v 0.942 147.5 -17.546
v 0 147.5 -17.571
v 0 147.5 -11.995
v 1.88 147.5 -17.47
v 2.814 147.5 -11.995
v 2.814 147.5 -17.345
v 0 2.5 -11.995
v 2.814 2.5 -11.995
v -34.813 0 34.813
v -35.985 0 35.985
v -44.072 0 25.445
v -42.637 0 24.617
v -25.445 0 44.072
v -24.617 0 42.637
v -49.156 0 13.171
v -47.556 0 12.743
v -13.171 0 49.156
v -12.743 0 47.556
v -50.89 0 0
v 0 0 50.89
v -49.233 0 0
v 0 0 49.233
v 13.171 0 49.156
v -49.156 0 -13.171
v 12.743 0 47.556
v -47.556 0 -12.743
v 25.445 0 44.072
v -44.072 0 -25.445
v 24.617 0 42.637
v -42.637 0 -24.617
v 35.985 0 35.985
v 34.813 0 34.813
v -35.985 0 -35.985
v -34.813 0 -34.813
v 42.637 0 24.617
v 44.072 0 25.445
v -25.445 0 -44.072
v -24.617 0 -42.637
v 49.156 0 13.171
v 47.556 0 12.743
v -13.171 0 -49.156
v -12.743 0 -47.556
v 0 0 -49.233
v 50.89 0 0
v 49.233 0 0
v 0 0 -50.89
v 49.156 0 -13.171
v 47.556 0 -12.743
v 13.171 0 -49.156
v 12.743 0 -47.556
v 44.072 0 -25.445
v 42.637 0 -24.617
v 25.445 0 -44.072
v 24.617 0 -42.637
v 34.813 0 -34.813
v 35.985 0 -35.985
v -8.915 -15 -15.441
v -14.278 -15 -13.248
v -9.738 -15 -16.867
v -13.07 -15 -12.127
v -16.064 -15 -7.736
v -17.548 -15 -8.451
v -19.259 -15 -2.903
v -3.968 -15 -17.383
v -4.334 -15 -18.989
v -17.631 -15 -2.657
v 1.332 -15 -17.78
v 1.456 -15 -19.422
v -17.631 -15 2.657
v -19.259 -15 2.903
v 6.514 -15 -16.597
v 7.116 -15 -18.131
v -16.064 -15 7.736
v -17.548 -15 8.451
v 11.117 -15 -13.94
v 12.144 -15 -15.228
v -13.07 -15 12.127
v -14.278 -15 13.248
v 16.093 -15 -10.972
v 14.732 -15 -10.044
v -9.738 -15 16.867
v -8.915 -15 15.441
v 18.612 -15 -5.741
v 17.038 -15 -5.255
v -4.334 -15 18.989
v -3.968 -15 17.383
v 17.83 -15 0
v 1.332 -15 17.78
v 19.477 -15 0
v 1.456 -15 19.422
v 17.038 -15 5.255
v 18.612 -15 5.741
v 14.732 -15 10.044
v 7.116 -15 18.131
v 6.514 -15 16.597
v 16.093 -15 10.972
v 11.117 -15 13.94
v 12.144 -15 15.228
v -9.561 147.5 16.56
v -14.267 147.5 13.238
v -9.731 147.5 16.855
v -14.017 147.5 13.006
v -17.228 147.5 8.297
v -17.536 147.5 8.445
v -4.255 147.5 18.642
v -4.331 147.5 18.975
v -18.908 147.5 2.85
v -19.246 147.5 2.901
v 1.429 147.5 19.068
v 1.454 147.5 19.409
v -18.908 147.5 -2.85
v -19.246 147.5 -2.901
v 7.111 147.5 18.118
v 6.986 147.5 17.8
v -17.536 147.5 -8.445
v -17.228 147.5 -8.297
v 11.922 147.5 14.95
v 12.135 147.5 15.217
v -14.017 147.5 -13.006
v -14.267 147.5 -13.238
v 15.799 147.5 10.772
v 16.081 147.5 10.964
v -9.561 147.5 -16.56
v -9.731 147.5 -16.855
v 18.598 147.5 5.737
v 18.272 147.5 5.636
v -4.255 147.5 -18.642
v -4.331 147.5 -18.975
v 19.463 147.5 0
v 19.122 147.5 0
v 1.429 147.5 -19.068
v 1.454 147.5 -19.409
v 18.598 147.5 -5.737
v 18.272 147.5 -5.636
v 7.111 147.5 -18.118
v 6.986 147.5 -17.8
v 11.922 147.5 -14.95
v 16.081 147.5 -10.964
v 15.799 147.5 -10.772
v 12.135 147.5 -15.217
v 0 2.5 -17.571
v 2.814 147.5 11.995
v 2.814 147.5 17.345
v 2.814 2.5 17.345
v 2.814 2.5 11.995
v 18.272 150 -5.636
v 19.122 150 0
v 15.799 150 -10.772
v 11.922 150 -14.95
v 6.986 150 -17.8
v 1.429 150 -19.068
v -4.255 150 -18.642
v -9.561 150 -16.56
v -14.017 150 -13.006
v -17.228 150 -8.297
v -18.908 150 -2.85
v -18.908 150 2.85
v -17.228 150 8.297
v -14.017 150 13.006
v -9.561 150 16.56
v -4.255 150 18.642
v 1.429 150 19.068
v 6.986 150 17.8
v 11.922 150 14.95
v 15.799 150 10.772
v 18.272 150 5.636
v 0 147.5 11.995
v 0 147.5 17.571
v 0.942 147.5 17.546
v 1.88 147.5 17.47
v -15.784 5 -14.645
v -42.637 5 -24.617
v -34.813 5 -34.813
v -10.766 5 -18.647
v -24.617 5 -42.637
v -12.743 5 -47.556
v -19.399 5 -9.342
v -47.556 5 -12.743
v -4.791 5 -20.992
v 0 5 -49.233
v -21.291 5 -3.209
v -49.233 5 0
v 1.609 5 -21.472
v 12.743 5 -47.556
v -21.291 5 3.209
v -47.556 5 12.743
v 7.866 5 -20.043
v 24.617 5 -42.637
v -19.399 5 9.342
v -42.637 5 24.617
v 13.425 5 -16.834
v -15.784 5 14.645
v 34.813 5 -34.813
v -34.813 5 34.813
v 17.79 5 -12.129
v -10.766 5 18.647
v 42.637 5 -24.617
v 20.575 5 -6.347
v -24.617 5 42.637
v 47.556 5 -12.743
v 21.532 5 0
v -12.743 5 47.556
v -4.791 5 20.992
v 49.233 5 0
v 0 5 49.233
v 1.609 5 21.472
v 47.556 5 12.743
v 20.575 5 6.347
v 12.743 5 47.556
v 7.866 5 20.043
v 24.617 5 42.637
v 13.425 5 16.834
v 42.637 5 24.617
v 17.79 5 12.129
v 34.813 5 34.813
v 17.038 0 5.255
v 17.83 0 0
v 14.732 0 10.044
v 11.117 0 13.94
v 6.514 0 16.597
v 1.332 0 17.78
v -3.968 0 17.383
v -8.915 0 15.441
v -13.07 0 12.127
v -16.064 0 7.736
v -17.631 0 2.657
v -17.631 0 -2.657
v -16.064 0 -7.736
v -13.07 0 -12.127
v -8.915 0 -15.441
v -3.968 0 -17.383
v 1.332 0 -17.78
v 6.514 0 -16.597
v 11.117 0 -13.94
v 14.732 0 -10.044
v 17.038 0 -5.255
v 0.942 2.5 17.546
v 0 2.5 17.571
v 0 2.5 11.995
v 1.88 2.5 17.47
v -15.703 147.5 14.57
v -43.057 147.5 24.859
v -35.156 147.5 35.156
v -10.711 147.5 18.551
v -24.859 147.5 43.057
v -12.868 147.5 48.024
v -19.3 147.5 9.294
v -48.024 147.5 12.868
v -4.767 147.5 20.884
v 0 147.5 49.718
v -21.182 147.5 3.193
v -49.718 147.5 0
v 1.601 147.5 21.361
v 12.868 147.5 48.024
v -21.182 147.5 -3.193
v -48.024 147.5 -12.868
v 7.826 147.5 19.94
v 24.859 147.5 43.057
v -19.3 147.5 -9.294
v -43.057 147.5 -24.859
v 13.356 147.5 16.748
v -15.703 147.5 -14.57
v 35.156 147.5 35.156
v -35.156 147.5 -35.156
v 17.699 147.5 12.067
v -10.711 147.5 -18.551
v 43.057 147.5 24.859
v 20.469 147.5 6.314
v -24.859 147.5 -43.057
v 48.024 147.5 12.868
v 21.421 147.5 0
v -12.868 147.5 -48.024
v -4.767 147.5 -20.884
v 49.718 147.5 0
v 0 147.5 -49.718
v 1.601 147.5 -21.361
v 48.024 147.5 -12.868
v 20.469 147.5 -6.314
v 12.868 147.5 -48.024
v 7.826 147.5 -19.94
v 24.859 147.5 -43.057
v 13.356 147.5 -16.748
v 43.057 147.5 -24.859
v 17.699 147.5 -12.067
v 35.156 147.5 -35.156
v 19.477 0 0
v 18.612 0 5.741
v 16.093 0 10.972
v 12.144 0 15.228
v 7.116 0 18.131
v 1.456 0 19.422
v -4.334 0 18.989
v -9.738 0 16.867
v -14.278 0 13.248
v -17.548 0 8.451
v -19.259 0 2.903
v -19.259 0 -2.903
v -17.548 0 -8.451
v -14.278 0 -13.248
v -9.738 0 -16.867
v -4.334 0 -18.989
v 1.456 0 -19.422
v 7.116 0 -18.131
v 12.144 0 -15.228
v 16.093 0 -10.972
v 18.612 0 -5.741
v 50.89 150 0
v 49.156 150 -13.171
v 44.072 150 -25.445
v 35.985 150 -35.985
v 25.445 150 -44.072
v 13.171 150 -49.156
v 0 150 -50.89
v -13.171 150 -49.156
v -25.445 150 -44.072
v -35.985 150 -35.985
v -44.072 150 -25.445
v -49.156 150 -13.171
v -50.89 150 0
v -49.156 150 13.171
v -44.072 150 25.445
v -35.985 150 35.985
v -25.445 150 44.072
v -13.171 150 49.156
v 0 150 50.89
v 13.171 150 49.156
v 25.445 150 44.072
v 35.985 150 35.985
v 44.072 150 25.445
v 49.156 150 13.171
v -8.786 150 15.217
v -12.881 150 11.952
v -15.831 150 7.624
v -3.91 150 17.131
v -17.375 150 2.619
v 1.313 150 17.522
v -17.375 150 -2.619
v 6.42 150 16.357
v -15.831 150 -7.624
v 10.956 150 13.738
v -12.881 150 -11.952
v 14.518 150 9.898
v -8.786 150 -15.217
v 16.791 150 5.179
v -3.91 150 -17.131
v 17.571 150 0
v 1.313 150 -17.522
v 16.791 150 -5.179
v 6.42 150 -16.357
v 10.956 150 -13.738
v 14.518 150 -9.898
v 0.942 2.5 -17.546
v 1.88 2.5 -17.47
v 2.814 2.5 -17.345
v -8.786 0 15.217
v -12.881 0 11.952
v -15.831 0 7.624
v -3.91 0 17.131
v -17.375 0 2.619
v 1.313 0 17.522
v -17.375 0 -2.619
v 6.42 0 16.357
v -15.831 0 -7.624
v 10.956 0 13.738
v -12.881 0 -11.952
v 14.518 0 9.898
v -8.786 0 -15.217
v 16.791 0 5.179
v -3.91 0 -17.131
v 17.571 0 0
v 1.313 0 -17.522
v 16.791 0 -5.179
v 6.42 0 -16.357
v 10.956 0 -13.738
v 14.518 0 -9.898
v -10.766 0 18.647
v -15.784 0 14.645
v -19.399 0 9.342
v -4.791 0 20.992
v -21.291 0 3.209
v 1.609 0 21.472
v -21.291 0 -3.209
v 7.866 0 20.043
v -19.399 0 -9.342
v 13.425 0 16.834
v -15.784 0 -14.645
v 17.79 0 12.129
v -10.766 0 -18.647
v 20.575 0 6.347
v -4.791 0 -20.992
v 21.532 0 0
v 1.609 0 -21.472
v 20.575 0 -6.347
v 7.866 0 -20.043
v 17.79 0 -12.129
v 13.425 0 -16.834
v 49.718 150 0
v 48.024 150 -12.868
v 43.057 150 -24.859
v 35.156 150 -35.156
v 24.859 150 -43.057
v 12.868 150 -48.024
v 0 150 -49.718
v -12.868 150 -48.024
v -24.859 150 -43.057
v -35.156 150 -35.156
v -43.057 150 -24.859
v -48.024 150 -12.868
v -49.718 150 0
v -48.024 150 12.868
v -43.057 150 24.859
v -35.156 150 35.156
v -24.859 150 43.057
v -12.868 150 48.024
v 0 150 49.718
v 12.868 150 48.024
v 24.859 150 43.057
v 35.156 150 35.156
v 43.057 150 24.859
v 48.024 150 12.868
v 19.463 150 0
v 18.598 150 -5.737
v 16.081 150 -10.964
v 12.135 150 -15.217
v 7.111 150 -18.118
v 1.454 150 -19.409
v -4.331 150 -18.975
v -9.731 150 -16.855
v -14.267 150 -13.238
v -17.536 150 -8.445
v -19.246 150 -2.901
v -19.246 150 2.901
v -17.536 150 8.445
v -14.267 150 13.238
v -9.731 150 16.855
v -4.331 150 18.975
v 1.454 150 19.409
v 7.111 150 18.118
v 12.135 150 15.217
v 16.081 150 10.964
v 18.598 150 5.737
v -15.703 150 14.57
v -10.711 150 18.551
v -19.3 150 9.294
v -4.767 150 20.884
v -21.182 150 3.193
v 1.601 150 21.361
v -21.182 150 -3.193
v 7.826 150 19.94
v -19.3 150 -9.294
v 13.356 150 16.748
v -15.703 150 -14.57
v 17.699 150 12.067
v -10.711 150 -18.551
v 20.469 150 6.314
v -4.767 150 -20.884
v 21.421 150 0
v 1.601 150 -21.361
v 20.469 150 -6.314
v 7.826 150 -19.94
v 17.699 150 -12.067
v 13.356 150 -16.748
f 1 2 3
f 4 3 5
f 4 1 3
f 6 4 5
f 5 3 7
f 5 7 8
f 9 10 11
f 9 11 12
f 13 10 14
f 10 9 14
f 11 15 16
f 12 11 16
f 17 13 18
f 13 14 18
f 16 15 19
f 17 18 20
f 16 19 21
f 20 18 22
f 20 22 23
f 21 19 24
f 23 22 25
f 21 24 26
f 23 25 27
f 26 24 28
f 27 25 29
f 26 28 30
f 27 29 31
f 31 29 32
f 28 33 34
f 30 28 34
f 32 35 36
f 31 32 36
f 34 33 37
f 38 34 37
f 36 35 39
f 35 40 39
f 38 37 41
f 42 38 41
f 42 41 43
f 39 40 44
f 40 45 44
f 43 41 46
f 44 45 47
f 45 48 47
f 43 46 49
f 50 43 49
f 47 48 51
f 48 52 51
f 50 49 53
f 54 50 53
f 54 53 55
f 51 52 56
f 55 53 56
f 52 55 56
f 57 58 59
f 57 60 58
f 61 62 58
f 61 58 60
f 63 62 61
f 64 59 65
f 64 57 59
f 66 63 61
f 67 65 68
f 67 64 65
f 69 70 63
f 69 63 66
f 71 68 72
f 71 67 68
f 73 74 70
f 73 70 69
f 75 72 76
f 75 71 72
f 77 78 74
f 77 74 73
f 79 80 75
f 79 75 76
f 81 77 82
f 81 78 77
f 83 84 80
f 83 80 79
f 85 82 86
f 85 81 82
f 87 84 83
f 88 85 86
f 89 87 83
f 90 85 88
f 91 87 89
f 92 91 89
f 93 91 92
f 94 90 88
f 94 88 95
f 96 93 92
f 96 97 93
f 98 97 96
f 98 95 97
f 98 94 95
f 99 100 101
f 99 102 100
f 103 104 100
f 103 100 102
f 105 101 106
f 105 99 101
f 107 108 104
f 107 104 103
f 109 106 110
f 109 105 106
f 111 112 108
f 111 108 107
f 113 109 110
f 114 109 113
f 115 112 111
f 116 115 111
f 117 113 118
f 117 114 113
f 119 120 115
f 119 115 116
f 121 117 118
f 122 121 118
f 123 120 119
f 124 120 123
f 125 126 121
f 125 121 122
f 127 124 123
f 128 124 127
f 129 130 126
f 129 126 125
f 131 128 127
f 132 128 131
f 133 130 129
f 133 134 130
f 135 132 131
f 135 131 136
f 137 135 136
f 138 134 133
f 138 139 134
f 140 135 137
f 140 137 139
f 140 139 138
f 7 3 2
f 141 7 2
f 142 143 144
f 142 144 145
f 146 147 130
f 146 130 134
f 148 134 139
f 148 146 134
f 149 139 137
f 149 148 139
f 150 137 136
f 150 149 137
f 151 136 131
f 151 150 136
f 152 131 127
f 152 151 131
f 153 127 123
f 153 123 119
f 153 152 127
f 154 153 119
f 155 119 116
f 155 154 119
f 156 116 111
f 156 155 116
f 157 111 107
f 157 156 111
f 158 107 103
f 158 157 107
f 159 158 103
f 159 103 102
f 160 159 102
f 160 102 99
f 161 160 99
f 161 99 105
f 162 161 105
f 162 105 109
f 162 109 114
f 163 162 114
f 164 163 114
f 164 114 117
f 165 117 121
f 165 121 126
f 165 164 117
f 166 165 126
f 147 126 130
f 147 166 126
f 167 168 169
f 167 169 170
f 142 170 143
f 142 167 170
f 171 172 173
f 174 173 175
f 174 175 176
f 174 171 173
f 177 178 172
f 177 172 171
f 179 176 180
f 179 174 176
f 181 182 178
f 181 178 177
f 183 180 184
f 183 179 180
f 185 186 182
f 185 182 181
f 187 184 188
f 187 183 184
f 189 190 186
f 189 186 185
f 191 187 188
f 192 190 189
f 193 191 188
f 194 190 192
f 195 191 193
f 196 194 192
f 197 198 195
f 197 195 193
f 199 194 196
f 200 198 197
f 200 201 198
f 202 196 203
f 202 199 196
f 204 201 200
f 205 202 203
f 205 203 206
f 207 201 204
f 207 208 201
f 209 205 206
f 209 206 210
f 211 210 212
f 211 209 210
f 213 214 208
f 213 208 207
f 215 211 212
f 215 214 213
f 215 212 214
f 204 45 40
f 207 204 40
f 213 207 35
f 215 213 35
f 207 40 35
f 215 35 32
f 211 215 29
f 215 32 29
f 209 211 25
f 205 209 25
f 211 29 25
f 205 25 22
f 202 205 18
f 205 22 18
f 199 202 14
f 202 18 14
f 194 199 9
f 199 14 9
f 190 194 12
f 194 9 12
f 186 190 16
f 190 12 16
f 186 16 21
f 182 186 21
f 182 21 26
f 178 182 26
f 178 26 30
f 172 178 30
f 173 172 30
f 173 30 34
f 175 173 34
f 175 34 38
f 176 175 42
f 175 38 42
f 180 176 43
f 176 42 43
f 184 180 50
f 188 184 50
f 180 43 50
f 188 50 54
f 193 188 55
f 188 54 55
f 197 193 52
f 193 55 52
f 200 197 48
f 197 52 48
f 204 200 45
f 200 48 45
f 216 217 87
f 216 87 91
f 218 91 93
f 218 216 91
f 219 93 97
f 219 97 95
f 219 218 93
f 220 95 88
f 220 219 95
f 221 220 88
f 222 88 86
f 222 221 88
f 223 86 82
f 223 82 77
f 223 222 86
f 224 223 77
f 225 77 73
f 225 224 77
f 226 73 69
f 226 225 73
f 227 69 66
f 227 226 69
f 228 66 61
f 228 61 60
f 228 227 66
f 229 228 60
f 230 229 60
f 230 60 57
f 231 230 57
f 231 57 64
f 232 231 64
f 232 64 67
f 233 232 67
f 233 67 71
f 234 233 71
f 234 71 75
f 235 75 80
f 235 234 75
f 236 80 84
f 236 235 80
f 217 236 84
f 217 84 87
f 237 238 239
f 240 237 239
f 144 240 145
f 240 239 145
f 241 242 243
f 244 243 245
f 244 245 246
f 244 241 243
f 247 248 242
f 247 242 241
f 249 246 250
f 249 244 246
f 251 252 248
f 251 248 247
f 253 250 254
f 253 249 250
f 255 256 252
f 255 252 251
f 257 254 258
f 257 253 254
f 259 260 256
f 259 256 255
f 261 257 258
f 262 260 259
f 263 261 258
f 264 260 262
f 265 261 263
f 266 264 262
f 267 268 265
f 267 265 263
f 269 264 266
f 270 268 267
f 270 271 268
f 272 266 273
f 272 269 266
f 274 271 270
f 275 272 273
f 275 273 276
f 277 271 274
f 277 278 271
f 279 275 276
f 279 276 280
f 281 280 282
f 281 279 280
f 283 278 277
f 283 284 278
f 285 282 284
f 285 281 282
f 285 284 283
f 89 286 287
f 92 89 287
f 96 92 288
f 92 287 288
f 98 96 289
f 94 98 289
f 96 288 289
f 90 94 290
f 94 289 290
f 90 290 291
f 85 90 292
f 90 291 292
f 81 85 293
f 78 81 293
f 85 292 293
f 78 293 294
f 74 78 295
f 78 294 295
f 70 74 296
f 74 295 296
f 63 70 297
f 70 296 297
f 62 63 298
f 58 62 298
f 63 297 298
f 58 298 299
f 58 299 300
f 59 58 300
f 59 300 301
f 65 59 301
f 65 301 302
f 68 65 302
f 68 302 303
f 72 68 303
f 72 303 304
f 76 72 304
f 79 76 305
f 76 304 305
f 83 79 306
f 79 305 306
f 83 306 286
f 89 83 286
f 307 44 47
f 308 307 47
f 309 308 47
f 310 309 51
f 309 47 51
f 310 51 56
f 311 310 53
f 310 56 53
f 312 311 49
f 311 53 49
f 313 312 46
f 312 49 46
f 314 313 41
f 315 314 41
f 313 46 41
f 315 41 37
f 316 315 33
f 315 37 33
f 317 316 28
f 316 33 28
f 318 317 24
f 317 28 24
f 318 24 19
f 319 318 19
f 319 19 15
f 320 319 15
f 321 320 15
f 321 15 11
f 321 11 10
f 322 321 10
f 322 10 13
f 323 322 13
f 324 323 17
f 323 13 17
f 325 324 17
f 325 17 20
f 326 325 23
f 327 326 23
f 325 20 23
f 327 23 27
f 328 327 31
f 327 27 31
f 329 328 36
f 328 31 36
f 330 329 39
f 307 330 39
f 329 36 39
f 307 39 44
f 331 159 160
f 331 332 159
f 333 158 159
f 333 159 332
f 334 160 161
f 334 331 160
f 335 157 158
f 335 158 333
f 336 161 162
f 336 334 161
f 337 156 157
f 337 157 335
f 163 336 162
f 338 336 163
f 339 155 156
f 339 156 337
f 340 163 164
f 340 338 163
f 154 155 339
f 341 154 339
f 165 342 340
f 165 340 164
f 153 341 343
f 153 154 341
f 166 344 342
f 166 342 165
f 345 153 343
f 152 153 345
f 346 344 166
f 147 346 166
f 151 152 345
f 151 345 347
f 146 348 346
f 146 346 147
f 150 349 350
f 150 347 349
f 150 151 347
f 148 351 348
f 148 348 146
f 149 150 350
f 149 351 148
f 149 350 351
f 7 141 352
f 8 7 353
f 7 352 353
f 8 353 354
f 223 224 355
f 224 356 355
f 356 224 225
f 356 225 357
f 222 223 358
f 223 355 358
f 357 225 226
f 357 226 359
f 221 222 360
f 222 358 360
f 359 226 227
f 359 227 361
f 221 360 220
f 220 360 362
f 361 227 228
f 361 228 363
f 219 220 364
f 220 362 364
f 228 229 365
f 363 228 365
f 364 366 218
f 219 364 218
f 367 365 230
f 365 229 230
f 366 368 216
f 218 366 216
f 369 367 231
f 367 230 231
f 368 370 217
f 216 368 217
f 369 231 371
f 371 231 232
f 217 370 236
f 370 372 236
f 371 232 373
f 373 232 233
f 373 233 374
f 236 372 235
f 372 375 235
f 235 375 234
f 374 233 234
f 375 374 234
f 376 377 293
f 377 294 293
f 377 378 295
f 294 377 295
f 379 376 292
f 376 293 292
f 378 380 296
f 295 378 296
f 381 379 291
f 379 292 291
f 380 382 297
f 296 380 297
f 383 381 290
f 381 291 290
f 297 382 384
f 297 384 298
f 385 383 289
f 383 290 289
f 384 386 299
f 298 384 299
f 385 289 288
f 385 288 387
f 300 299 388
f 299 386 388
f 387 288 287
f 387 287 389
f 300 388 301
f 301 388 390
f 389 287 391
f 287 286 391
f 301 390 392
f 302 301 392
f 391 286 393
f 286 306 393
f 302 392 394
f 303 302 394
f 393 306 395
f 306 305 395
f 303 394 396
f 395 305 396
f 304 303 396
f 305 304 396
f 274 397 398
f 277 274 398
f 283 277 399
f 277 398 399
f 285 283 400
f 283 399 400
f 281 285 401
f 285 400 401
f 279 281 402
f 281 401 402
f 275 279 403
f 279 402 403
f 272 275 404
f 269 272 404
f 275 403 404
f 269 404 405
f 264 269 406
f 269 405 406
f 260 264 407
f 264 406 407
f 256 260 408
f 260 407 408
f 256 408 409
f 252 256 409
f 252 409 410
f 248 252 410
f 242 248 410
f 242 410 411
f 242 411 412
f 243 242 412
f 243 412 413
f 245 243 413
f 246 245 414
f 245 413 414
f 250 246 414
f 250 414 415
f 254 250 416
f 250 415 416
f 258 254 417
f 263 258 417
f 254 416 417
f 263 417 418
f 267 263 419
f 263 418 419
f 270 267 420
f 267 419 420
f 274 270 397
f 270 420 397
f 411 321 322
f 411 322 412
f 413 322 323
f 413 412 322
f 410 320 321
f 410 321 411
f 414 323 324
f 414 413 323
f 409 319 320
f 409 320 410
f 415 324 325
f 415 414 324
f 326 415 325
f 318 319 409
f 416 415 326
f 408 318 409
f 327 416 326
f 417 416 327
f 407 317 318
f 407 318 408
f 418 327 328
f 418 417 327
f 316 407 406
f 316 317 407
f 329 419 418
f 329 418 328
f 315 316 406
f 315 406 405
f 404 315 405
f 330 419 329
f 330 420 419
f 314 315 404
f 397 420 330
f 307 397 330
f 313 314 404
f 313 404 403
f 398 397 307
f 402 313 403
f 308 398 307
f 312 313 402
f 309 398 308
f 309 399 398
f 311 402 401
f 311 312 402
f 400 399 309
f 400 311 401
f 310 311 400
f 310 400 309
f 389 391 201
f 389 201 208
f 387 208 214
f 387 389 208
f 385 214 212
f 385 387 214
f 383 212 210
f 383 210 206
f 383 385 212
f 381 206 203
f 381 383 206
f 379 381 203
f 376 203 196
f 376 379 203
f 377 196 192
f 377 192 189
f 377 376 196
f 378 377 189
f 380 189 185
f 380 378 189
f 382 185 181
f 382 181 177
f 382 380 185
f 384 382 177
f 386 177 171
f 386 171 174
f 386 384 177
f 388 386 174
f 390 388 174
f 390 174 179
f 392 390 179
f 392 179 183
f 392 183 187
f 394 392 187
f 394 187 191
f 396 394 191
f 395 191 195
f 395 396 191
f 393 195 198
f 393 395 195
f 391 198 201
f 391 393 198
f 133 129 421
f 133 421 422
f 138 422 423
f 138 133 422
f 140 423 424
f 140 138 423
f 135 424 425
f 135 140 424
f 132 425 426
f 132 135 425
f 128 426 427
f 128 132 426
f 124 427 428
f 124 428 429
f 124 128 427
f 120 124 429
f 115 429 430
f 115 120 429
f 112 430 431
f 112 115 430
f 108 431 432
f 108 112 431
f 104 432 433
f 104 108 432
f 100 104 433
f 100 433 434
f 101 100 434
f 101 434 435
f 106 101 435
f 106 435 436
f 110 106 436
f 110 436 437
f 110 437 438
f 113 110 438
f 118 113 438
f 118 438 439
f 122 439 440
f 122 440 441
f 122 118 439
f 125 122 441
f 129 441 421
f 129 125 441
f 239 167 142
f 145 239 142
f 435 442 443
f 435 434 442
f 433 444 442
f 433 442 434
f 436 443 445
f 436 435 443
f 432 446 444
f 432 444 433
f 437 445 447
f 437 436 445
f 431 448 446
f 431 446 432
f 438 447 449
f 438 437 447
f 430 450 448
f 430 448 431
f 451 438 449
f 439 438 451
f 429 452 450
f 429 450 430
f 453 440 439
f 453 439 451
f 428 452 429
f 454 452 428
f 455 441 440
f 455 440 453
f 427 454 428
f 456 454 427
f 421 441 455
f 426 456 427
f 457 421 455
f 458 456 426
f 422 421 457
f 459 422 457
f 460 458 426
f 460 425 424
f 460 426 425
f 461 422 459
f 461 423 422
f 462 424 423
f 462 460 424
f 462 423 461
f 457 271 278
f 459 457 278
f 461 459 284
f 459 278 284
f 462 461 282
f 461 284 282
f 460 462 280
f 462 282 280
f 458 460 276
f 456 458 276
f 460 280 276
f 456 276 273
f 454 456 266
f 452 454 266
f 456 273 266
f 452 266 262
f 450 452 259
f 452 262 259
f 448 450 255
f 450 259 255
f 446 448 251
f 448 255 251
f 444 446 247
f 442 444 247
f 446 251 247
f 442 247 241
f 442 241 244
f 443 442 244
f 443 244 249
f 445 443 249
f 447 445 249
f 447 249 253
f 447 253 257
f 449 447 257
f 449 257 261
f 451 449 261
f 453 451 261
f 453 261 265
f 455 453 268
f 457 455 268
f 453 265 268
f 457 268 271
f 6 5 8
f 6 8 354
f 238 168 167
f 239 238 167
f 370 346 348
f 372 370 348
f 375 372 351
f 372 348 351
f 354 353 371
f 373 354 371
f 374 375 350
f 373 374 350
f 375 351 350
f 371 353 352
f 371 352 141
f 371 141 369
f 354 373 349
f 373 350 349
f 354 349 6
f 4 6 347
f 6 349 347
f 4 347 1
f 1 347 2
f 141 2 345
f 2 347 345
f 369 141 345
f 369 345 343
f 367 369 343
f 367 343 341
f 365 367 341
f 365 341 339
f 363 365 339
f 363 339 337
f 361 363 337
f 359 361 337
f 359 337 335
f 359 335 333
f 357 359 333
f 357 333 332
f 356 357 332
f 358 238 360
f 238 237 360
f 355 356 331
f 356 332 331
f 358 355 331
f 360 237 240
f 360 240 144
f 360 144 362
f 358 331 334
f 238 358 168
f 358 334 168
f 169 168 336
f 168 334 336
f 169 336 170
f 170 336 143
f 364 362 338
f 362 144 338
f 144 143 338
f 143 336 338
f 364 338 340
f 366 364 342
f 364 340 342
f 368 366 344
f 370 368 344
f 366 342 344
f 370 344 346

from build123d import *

# Parameters (mm, degrees)
CROQUIS1_R              = 50.89009471
SALIENTE_EXTRUIR1_DEPTH = 150
CROQUIS2_R              = 17.571410618
CORTAR_EXTRUIR1_DEPTH   = 151
CROQUIS3_R              = 49.718427997
CROQUIS3_R_2            = 19.121829202
CORTAR_EXTRUIR2_DEPTH   = 2.5
CROQUIS4_R              = 19.476892412
CROQUIS4_R_2            = 17.829813716
SALIENTE_EXTRUIR3_DEPTH = 15
CROQUIS6_R              = 49.233249933
CROQUIS6_R_2            = 21.531739476
CORTAR_EXTRUIR4_DEPTH   = 5
CROQUIS8_W              = 2.81398907
CROQUIS8_H              = 5.576117682
SALIENTE_EXTRUIR6_DEPTH = 145
CROQUIS9_R              = 21.421140015
CROQUIS9_R_2            = 19.462987184
SALIENTE_EXTRUIR7_DEPTH = 2.5


with BuildPart() as part:
    # Croquis1 → Saliente-Extruir1 (new body)
    with BuildSketch(Plane(origin=(0, 0, 0), x_dir=(1, 0, 0), z_dir=(0, 1, 0))):
        Circle(CROQUIS1_R)
    extrude(amount=SALIENTE_EXTRUIR1_DEPTH)

    # Croquis2 → Cortar-Extruir1 (cut, through all)
    with BuildSketch(Plane(origin=(0, 150, 0), x_dir=(1, 0, 0), z_dir=(0, 1, 0))):
        Circle(CROQUIS2_R)
    extrude(amount=-CORTAR_EXTRUIR1_DEPTH, mode=Mode.SUBTRACT)

    # Croquis3 → Cortar-Extruir2 (cut)
    with BuildSketch(Plane(origin=(0, 150, 0), x_dir=(1, 0, 0), z_dir=(0, 1, 0))):
        Circle(CROQUIS3_R)
        Circle(CROQUIS3_R_2, mode=Mode.SUBTRACT)
    extrude(amount=-CORTAR_EXTRUIR2_DEPTH, mode=Mode.SUBTRACT)

    # Croquis4 → Saliente-Extruir3 (add)
    with BuildSketch(Plane.XZ):
        Circle(CROQUIS4_R)
        Circle(CROQUIS4_R_2, mode=Mode.SUBTRACT)
    extrude(amount=SALIENTE_EXTRUIR3_DEPTH)

    # Croquis6 → Cortar-Extruir4 (cut)
    with BuildSketch(Plane.XZ):
        Circle(CROQUIS6_R)
        Circle(CROQUIS6_R_2, mode=Mode.SUBTRACT)
    extrude(amount=-CORTAR_EXTRUIR4_DEPTH, mode=Mode.SUBTRACT)

    # Croquis8 → Saliente-Extruir6 (add)
    with BuildSketch(Plane(origin=(0, 147.5, 0), x_dir=(1, 0, 0), z_dir=(0, 1, 0))):
        with Locations((1.406994535, 14.783351777)):
            Rectangle(CROQUIS8_W, CROQUIS8_H)
        with Locations((1.406994535, -14.783351777)):
            Rectangle(CROQUIS8_W, CROQUIS8_H)
    extrude(amount=-SALIENTE_EXTRUIR6_DEPTH)

    # Croquis9 → Saliente-Extruir7 (add)
    with BuildSketch(Plane(origin=(0, 147.5, 0), x_dir=(1, 0, 0), z_dir=(0, 1, 0))):
        Circle(CROQUIS9_R)
        Circle(CROQUIS9_R_2, mode=Mode.SUBTRACT)
    extrude(amount=SALIENTE_EXTRUIR7_DEPTH)


solid = part.part
